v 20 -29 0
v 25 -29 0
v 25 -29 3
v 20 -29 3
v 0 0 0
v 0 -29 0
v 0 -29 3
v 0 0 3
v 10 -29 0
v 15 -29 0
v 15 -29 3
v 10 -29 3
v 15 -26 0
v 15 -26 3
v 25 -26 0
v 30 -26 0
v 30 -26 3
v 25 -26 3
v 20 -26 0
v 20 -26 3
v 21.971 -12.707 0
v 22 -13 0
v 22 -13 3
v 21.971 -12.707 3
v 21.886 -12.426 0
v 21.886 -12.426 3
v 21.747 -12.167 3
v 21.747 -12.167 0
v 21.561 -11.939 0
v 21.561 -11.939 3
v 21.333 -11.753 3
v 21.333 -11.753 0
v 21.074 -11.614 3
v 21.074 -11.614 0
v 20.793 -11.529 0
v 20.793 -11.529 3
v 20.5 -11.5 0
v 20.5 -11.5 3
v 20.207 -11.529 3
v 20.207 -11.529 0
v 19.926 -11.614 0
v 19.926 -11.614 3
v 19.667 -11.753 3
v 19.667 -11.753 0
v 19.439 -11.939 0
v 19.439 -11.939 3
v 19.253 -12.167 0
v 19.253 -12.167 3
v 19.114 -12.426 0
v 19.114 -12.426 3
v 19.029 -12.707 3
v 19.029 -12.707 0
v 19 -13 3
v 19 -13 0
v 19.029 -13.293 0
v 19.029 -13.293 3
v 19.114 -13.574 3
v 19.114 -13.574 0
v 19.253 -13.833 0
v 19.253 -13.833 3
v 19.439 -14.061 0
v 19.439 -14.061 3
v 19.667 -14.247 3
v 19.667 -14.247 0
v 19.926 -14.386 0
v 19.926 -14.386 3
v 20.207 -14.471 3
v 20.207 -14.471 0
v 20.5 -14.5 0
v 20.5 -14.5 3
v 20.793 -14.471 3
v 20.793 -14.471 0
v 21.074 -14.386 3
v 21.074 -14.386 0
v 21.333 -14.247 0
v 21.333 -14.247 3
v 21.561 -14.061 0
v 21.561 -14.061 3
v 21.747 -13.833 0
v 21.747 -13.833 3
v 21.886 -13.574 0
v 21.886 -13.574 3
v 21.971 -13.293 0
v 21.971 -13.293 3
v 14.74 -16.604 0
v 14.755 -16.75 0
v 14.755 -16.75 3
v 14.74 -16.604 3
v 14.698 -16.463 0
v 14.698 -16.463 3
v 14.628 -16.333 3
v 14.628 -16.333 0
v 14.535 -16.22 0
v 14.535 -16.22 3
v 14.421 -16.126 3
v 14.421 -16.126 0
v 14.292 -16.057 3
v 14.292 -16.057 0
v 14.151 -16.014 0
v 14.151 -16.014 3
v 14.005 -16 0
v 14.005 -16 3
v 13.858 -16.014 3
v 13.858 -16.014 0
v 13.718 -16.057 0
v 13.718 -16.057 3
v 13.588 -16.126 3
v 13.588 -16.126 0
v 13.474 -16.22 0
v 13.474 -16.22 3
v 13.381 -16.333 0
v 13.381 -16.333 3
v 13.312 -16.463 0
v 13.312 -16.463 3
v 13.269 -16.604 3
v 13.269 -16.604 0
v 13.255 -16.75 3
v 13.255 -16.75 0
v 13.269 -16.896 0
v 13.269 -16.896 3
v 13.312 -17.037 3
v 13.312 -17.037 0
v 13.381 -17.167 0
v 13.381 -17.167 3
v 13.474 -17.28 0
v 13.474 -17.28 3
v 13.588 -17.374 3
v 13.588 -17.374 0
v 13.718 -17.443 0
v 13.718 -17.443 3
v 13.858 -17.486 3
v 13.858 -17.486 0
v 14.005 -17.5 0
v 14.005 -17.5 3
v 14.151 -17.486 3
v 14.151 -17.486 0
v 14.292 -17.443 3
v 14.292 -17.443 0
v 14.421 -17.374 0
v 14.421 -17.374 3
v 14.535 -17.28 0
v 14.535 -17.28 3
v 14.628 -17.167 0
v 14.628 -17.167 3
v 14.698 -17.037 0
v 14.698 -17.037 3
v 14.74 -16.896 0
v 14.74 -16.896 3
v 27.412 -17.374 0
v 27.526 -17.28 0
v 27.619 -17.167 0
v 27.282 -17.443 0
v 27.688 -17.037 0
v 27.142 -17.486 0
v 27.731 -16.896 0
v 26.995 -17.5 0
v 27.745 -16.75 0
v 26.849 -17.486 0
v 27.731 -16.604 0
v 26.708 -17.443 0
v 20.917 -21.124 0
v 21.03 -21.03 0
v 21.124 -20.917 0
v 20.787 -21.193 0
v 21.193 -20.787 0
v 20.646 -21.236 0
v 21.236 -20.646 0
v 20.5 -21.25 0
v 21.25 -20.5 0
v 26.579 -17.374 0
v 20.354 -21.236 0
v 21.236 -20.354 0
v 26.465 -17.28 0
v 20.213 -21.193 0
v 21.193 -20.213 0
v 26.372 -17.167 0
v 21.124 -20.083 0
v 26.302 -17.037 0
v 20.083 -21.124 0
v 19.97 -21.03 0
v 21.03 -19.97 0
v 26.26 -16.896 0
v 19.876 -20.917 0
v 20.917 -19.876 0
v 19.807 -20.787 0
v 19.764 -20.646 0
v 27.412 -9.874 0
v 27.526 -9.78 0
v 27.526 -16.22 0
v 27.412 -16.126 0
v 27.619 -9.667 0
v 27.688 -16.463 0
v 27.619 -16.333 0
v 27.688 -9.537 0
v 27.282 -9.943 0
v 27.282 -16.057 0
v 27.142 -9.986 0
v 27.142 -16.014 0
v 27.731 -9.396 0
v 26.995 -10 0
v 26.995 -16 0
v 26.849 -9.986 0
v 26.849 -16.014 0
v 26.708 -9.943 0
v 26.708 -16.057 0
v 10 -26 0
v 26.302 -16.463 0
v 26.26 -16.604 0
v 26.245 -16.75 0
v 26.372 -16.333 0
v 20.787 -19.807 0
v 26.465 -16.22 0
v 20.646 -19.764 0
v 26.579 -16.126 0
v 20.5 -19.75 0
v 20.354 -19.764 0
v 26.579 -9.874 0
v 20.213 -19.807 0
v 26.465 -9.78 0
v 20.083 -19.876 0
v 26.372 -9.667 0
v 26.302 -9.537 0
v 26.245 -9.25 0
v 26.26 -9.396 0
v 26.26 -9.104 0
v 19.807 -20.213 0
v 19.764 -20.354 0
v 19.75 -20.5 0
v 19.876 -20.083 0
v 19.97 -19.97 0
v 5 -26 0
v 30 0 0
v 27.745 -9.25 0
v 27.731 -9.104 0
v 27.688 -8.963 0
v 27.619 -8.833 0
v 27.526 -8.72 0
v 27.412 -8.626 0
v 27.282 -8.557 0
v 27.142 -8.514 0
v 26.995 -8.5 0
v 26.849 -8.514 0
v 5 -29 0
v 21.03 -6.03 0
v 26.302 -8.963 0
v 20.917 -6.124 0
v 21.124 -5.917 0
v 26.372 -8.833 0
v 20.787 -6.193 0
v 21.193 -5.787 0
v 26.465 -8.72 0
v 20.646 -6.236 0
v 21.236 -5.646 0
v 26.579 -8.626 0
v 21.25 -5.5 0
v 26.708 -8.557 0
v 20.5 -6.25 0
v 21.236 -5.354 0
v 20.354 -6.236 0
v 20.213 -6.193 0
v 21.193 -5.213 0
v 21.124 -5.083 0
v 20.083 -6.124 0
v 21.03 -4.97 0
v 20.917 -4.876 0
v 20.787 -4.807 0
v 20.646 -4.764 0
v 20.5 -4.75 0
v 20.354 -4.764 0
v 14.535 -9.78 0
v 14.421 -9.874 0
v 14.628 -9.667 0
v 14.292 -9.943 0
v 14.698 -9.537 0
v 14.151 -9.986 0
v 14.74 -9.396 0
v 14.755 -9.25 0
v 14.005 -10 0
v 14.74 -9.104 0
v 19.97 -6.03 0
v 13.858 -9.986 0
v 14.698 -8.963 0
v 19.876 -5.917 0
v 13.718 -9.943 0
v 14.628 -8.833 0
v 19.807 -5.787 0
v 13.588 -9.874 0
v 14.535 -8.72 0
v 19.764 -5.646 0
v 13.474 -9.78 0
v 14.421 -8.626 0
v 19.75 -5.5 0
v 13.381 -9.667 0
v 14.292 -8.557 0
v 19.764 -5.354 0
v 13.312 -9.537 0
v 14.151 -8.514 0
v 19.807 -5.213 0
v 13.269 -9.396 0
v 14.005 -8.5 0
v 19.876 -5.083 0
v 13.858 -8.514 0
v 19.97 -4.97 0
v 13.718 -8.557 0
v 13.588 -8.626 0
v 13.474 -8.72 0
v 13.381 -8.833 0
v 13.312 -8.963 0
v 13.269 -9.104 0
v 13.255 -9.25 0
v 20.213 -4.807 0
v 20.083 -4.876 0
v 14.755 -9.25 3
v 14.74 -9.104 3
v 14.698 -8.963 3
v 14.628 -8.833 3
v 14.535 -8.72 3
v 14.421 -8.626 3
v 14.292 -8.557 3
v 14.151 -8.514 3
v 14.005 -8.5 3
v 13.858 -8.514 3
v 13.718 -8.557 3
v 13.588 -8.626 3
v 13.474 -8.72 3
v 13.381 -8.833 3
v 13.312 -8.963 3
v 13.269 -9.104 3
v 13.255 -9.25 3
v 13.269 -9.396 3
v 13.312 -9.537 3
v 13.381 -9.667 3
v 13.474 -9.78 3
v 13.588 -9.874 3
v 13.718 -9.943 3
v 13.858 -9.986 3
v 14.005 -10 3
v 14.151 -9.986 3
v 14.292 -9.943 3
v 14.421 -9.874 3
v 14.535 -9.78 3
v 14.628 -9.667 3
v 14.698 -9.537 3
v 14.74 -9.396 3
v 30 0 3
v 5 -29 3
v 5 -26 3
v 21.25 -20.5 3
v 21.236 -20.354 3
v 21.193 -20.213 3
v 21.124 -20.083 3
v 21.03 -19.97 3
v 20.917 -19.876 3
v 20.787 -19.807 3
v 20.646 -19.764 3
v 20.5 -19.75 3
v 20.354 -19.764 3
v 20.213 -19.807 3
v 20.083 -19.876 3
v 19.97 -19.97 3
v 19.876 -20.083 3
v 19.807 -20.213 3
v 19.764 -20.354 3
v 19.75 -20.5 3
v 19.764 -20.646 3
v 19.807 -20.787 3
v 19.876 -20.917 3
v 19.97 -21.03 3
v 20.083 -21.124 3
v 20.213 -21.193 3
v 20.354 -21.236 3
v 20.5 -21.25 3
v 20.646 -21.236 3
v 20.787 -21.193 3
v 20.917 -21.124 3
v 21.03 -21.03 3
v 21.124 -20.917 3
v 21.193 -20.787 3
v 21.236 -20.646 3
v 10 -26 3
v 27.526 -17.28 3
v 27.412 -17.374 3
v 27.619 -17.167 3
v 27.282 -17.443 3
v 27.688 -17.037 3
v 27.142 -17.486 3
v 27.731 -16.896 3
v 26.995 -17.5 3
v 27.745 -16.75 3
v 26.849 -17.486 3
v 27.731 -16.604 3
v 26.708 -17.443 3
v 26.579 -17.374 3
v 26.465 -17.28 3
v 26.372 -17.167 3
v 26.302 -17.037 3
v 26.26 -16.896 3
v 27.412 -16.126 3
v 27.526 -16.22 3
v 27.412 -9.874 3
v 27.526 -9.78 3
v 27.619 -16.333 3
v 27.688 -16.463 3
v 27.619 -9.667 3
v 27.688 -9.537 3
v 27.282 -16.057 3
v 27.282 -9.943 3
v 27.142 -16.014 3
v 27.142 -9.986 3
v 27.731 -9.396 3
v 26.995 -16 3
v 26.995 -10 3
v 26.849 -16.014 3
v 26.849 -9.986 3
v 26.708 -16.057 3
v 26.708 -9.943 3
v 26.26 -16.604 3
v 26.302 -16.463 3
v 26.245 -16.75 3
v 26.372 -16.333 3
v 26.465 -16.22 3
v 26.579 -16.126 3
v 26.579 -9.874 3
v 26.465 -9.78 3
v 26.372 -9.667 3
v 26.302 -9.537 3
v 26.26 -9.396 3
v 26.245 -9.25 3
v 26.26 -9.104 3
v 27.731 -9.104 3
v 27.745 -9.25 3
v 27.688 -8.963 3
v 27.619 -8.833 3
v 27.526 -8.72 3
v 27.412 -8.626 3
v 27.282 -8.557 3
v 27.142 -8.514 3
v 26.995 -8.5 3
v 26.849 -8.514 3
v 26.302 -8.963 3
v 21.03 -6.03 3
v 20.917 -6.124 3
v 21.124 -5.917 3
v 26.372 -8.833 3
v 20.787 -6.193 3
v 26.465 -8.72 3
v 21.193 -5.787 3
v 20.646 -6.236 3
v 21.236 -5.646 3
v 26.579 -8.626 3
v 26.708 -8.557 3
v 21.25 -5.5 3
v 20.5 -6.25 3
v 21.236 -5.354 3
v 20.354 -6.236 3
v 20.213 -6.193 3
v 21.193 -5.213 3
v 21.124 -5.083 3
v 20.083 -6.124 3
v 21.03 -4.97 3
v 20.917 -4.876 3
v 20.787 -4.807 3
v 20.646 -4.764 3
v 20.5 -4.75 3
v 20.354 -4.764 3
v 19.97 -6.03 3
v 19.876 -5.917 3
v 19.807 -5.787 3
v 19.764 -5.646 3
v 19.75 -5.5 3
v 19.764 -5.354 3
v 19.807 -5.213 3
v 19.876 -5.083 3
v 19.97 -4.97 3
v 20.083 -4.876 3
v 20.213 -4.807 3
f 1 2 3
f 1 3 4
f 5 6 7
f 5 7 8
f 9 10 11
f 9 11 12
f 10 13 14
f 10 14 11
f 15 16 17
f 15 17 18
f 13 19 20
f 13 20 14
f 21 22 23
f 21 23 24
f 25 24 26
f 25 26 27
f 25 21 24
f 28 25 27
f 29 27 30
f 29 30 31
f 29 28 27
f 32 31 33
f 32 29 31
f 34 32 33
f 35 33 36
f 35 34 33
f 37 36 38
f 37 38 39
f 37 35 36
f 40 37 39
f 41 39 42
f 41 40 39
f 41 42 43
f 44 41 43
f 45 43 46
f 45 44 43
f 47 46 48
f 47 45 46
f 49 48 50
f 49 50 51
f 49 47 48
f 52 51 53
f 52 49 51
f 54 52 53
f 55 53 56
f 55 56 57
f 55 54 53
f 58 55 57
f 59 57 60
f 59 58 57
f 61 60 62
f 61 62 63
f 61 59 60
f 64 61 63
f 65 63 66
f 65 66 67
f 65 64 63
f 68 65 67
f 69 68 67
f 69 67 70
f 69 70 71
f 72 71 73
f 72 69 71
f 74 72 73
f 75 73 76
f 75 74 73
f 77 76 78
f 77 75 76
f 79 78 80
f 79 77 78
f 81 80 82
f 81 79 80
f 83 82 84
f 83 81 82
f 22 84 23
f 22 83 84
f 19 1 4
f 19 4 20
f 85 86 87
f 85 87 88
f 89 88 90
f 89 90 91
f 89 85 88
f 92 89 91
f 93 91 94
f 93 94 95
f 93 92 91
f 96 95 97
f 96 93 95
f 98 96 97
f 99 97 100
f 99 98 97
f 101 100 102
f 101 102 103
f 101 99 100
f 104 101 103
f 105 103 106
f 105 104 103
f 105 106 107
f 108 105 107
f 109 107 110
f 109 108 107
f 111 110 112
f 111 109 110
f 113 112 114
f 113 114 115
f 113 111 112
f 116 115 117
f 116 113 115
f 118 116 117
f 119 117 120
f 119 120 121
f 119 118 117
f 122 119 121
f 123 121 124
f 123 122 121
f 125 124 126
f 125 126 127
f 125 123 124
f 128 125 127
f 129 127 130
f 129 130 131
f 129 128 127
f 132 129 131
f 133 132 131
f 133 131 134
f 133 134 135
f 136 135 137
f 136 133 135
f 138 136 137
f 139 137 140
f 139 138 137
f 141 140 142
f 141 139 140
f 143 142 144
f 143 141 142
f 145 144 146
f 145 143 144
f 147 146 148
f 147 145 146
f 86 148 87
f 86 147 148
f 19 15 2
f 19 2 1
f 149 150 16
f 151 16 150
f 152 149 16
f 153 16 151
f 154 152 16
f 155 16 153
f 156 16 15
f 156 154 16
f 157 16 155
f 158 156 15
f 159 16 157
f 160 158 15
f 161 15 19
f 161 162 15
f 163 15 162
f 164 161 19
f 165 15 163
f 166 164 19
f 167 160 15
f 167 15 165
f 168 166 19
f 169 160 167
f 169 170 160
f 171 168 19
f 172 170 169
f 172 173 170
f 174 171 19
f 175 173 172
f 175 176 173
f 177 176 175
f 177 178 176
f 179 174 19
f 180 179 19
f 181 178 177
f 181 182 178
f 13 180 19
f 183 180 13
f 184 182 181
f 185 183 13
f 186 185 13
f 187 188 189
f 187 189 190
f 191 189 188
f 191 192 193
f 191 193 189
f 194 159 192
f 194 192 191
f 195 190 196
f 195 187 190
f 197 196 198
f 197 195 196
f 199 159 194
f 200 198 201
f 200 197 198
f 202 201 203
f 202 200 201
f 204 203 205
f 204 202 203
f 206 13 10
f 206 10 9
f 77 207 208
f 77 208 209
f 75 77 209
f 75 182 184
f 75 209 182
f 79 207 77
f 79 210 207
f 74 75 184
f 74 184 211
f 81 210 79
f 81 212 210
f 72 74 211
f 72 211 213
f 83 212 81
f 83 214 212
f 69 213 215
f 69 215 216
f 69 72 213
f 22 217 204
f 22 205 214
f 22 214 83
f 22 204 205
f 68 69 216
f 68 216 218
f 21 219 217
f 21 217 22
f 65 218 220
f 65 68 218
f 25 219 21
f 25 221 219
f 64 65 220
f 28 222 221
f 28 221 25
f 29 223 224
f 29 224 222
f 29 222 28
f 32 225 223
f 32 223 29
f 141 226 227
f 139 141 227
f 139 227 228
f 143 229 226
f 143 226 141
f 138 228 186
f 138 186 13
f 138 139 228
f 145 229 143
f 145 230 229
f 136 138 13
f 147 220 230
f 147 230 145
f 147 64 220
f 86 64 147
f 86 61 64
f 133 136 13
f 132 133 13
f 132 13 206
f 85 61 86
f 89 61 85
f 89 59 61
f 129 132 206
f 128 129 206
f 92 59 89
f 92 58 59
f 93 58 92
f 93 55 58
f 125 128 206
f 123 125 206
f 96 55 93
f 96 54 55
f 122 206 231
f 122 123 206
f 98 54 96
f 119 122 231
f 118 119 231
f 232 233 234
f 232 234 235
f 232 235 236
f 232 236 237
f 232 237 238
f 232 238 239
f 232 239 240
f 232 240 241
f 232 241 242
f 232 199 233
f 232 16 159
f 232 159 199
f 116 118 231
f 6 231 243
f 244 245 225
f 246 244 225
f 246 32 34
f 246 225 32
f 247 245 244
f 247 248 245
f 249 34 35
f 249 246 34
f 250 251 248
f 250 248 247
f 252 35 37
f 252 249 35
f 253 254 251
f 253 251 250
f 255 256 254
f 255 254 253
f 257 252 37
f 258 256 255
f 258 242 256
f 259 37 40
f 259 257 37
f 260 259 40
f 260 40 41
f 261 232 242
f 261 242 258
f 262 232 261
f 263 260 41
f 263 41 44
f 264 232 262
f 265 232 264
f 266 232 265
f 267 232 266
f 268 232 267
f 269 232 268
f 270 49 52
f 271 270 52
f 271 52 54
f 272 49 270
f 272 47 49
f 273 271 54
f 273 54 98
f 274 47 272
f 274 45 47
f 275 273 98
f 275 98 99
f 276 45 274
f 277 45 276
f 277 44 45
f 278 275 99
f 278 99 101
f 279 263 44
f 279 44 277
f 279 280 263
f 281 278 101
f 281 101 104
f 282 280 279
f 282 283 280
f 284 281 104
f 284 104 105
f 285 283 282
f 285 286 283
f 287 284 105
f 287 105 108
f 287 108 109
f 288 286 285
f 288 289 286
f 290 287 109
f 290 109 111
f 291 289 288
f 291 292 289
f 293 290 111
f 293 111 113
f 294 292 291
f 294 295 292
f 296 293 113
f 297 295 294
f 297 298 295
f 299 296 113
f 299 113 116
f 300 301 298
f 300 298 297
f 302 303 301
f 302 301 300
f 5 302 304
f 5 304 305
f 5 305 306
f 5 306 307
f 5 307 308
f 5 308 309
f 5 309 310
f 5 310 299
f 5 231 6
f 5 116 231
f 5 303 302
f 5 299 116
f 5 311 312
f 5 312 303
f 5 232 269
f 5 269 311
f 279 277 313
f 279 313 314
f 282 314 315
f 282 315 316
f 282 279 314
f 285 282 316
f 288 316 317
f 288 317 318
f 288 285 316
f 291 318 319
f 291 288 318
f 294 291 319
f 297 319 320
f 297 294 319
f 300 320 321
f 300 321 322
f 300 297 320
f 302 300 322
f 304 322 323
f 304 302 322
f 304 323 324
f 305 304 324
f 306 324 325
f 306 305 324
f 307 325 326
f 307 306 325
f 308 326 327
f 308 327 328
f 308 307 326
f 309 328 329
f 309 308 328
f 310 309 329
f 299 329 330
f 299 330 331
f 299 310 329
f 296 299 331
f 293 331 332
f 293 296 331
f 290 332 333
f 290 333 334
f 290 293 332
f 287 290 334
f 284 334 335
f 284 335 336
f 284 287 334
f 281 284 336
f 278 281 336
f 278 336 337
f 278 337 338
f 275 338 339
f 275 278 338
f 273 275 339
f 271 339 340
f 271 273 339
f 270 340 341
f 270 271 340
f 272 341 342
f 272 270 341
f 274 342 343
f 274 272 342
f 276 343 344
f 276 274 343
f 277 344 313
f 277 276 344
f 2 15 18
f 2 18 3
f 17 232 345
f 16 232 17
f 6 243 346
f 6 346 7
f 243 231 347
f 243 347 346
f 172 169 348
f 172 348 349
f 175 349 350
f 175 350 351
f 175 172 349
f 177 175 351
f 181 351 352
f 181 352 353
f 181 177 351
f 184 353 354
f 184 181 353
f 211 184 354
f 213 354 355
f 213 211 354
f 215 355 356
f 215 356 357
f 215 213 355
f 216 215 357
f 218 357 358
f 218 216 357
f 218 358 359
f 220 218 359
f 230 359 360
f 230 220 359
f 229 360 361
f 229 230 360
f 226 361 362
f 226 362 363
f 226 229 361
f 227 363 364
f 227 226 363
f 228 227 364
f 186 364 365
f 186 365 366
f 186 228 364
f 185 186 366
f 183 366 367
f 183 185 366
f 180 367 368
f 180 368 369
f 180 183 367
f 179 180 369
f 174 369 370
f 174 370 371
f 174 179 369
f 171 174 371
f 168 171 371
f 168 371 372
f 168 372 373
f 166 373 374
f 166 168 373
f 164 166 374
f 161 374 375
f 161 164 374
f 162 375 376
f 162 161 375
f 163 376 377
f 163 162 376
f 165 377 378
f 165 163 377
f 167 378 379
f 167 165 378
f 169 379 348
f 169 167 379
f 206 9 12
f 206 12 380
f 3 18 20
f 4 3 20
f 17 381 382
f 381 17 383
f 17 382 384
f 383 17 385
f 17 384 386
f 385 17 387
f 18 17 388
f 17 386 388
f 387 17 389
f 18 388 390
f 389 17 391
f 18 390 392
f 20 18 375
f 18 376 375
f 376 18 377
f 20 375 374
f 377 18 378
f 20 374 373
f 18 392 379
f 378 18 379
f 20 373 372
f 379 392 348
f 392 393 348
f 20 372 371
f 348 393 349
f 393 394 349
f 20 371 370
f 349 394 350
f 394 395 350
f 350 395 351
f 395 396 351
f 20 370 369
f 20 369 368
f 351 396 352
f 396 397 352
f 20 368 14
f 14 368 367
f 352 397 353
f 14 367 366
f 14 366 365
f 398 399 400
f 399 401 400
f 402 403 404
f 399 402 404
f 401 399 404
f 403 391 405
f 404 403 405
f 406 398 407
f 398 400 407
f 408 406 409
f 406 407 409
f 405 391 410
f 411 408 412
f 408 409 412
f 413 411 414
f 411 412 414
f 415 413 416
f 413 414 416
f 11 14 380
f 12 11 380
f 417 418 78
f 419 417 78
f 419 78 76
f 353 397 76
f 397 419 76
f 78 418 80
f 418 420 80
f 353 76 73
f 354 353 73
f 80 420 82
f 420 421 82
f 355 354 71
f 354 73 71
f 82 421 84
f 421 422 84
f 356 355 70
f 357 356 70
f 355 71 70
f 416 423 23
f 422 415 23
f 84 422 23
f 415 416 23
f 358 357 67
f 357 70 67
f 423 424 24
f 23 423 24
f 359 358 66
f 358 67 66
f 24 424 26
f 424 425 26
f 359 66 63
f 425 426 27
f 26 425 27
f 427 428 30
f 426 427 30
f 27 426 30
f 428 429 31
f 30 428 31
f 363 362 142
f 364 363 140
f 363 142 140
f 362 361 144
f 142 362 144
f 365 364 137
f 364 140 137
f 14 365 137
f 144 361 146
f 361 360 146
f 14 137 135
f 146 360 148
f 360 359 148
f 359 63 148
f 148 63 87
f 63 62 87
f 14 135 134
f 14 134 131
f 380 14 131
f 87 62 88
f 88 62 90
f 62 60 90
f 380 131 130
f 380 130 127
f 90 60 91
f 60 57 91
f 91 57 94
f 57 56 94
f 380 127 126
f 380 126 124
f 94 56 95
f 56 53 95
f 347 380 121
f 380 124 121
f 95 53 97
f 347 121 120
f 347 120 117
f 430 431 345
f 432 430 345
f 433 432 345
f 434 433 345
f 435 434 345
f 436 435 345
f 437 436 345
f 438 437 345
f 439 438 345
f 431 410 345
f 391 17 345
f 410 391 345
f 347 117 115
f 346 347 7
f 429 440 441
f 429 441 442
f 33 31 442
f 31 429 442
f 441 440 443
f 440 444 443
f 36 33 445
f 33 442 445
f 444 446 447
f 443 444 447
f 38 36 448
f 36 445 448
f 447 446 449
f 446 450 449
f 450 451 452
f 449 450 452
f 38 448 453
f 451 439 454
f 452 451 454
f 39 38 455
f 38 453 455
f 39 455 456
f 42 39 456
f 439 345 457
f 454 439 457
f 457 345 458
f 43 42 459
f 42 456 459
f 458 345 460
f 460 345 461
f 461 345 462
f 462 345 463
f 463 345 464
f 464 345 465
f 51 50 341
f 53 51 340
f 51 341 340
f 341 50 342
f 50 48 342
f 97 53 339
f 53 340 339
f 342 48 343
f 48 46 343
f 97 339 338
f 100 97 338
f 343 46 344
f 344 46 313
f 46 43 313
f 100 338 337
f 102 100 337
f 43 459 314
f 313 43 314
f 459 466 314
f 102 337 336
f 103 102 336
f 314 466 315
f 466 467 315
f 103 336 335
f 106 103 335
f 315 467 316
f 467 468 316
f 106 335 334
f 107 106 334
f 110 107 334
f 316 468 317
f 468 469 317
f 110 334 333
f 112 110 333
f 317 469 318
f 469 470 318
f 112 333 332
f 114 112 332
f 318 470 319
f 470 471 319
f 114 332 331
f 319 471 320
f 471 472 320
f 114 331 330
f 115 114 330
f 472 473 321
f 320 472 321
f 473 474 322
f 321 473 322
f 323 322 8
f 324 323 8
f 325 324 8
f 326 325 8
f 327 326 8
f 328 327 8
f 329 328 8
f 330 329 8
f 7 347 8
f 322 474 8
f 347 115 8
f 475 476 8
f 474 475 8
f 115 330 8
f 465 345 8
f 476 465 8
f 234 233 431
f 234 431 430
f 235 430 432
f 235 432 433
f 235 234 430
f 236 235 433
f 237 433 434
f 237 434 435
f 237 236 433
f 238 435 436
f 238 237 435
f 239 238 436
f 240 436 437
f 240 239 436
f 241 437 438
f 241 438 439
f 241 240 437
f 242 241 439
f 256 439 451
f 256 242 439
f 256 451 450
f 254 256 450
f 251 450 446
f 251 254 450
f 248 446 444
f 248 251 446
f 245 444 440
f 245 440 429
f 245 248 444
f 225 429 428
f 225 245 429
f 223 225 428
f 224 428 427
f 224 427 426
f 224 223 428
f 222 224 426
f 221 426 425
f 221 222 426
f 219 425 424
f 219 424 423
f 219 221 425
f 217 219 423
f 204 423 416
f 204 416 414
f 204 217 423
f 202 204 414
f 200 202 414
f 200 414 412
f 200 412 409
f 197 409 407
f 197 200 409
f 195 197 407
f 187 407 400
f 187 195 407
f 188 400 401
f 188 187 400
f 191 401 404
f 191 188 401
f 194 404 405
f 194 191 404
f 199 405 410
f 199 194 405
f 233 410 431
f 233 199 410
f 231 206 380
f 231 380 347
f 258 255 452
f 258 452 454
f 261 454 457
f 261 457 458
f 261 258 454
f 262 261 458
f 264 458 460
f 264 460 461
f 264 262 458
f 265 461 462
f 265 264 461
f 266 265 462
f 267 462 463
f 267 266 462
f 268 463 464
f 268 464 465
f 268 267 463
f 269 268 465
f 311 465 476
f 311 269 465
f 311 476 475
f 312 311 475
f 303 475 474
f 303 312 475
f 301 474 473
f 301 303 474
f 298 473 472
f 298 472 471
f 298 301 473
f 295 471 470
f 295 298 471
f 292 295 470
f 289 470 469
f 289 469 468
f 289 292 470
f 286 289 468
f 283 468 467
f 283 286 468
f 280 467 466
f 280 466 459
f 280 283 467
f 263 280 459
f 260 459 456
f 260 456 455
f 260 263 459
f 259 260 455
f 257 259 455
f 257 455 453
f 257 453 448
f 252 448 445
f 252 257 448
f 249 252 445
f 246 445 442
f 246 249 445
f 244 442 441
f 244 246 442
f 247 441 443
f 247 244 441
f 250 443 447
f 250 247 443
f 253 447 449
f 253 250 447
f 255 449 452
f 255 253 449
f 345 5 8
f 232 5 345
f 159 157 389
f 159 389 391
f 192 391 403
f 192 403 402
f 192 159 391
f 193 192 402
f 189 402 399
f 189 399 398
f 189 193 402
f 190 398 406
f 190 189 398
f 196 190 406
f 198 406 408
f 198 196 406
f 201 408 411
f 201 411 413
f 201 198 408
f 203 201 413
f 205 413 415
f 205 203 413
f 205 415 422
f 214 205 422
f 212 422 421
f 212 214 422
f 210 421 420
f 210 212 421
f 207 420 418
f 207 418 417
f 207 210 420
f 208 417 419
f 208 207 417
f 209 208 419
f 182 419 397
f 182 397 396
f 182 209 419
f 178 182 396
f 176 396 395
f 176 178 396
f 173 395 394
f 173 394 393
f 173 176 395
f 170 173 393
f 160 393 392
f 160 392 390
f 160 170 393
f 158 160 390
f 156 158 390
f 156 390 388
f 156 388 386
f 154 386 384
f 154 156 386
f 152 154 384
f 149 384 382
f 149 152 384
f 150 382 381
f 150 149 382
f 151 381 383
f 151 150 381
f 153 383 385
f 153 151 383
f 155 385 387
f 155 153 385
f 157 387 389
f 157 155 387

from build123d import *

# Parameters (mm, degrees)
SKETCH1_R             = 0.75
SKETCH1_R_2           = 1.5
BOSS_EXTRUDE1_DEPTH   = 3
CORTAR_EXTRUIR1_START = -3
CROQUIS1_W            = 15
CROQUIS1_H            = 6.71890751
CORTAR_EXTRUIR1_DEPTH = 3


with BuildPart() as part:
    # Sketch1 → Boss-Extrude1 (new body)
    with BuildSketch(Plane.XY):
        Polygon((10, 0), (10, 3), (15, 3), (15, 0), (20, 0), (20, 3), (25, 3), (25, 0), (30, 0), (30, -26), (25, -26), (25, -29), (20, -29), (20, -26), (15, -26), (15, -29), (10, -29), (10, -26), (5, -26), (5, -29), (0, -29), (0, 0), align=None)
        with Locations((20.5, -5.5)):
            Circle(SKETCH1_R, mode=Mode.SUBTRACT)
        with Locations((26.995190528, -9.25)):
            Circle(SKETCH1_R, mode=Mode.SUBTRACT)
        with Locations((26.995190528, -16.75)):
            Circle(SKETCH1_R, mode=Mode.SUBTRACT)
        with Locations((20.5, -20.5)):
            Circle(SKETCH1_R, mode=Mode.SUBTRACT)
        with Locations((14.004809472, -16.75)):
            Circle(SKETCH1_R, mode=Mode.SUBTRACT)
        with Locations((14.004809472, -9.25)):
            Circle(SKETCH1_R, mode=Mode.SUBTRACT)
        with Locations((20.5, -13)):
            Circle(SKETCH1_R_2, mode=Mode.SUBTRACT)
    extrude(amount=BOSS_EXTRUDE1_DEPTH)

    # Croquis1 → Cortar-Extruir1 (cut)
    with BuildSketch(Plane.XY.offset(3).offset(CORTAR_EXTRUIR1_START)):
        with Locations((17.5, 3.359453755)):
            Rectangle(CROQUIS1_W, CROQUIS1_H)
    extrude(amount=CORTAR_EXTRUIR1_DEPTH, mode=Mode.SUBTRACT)


solid = part.part
